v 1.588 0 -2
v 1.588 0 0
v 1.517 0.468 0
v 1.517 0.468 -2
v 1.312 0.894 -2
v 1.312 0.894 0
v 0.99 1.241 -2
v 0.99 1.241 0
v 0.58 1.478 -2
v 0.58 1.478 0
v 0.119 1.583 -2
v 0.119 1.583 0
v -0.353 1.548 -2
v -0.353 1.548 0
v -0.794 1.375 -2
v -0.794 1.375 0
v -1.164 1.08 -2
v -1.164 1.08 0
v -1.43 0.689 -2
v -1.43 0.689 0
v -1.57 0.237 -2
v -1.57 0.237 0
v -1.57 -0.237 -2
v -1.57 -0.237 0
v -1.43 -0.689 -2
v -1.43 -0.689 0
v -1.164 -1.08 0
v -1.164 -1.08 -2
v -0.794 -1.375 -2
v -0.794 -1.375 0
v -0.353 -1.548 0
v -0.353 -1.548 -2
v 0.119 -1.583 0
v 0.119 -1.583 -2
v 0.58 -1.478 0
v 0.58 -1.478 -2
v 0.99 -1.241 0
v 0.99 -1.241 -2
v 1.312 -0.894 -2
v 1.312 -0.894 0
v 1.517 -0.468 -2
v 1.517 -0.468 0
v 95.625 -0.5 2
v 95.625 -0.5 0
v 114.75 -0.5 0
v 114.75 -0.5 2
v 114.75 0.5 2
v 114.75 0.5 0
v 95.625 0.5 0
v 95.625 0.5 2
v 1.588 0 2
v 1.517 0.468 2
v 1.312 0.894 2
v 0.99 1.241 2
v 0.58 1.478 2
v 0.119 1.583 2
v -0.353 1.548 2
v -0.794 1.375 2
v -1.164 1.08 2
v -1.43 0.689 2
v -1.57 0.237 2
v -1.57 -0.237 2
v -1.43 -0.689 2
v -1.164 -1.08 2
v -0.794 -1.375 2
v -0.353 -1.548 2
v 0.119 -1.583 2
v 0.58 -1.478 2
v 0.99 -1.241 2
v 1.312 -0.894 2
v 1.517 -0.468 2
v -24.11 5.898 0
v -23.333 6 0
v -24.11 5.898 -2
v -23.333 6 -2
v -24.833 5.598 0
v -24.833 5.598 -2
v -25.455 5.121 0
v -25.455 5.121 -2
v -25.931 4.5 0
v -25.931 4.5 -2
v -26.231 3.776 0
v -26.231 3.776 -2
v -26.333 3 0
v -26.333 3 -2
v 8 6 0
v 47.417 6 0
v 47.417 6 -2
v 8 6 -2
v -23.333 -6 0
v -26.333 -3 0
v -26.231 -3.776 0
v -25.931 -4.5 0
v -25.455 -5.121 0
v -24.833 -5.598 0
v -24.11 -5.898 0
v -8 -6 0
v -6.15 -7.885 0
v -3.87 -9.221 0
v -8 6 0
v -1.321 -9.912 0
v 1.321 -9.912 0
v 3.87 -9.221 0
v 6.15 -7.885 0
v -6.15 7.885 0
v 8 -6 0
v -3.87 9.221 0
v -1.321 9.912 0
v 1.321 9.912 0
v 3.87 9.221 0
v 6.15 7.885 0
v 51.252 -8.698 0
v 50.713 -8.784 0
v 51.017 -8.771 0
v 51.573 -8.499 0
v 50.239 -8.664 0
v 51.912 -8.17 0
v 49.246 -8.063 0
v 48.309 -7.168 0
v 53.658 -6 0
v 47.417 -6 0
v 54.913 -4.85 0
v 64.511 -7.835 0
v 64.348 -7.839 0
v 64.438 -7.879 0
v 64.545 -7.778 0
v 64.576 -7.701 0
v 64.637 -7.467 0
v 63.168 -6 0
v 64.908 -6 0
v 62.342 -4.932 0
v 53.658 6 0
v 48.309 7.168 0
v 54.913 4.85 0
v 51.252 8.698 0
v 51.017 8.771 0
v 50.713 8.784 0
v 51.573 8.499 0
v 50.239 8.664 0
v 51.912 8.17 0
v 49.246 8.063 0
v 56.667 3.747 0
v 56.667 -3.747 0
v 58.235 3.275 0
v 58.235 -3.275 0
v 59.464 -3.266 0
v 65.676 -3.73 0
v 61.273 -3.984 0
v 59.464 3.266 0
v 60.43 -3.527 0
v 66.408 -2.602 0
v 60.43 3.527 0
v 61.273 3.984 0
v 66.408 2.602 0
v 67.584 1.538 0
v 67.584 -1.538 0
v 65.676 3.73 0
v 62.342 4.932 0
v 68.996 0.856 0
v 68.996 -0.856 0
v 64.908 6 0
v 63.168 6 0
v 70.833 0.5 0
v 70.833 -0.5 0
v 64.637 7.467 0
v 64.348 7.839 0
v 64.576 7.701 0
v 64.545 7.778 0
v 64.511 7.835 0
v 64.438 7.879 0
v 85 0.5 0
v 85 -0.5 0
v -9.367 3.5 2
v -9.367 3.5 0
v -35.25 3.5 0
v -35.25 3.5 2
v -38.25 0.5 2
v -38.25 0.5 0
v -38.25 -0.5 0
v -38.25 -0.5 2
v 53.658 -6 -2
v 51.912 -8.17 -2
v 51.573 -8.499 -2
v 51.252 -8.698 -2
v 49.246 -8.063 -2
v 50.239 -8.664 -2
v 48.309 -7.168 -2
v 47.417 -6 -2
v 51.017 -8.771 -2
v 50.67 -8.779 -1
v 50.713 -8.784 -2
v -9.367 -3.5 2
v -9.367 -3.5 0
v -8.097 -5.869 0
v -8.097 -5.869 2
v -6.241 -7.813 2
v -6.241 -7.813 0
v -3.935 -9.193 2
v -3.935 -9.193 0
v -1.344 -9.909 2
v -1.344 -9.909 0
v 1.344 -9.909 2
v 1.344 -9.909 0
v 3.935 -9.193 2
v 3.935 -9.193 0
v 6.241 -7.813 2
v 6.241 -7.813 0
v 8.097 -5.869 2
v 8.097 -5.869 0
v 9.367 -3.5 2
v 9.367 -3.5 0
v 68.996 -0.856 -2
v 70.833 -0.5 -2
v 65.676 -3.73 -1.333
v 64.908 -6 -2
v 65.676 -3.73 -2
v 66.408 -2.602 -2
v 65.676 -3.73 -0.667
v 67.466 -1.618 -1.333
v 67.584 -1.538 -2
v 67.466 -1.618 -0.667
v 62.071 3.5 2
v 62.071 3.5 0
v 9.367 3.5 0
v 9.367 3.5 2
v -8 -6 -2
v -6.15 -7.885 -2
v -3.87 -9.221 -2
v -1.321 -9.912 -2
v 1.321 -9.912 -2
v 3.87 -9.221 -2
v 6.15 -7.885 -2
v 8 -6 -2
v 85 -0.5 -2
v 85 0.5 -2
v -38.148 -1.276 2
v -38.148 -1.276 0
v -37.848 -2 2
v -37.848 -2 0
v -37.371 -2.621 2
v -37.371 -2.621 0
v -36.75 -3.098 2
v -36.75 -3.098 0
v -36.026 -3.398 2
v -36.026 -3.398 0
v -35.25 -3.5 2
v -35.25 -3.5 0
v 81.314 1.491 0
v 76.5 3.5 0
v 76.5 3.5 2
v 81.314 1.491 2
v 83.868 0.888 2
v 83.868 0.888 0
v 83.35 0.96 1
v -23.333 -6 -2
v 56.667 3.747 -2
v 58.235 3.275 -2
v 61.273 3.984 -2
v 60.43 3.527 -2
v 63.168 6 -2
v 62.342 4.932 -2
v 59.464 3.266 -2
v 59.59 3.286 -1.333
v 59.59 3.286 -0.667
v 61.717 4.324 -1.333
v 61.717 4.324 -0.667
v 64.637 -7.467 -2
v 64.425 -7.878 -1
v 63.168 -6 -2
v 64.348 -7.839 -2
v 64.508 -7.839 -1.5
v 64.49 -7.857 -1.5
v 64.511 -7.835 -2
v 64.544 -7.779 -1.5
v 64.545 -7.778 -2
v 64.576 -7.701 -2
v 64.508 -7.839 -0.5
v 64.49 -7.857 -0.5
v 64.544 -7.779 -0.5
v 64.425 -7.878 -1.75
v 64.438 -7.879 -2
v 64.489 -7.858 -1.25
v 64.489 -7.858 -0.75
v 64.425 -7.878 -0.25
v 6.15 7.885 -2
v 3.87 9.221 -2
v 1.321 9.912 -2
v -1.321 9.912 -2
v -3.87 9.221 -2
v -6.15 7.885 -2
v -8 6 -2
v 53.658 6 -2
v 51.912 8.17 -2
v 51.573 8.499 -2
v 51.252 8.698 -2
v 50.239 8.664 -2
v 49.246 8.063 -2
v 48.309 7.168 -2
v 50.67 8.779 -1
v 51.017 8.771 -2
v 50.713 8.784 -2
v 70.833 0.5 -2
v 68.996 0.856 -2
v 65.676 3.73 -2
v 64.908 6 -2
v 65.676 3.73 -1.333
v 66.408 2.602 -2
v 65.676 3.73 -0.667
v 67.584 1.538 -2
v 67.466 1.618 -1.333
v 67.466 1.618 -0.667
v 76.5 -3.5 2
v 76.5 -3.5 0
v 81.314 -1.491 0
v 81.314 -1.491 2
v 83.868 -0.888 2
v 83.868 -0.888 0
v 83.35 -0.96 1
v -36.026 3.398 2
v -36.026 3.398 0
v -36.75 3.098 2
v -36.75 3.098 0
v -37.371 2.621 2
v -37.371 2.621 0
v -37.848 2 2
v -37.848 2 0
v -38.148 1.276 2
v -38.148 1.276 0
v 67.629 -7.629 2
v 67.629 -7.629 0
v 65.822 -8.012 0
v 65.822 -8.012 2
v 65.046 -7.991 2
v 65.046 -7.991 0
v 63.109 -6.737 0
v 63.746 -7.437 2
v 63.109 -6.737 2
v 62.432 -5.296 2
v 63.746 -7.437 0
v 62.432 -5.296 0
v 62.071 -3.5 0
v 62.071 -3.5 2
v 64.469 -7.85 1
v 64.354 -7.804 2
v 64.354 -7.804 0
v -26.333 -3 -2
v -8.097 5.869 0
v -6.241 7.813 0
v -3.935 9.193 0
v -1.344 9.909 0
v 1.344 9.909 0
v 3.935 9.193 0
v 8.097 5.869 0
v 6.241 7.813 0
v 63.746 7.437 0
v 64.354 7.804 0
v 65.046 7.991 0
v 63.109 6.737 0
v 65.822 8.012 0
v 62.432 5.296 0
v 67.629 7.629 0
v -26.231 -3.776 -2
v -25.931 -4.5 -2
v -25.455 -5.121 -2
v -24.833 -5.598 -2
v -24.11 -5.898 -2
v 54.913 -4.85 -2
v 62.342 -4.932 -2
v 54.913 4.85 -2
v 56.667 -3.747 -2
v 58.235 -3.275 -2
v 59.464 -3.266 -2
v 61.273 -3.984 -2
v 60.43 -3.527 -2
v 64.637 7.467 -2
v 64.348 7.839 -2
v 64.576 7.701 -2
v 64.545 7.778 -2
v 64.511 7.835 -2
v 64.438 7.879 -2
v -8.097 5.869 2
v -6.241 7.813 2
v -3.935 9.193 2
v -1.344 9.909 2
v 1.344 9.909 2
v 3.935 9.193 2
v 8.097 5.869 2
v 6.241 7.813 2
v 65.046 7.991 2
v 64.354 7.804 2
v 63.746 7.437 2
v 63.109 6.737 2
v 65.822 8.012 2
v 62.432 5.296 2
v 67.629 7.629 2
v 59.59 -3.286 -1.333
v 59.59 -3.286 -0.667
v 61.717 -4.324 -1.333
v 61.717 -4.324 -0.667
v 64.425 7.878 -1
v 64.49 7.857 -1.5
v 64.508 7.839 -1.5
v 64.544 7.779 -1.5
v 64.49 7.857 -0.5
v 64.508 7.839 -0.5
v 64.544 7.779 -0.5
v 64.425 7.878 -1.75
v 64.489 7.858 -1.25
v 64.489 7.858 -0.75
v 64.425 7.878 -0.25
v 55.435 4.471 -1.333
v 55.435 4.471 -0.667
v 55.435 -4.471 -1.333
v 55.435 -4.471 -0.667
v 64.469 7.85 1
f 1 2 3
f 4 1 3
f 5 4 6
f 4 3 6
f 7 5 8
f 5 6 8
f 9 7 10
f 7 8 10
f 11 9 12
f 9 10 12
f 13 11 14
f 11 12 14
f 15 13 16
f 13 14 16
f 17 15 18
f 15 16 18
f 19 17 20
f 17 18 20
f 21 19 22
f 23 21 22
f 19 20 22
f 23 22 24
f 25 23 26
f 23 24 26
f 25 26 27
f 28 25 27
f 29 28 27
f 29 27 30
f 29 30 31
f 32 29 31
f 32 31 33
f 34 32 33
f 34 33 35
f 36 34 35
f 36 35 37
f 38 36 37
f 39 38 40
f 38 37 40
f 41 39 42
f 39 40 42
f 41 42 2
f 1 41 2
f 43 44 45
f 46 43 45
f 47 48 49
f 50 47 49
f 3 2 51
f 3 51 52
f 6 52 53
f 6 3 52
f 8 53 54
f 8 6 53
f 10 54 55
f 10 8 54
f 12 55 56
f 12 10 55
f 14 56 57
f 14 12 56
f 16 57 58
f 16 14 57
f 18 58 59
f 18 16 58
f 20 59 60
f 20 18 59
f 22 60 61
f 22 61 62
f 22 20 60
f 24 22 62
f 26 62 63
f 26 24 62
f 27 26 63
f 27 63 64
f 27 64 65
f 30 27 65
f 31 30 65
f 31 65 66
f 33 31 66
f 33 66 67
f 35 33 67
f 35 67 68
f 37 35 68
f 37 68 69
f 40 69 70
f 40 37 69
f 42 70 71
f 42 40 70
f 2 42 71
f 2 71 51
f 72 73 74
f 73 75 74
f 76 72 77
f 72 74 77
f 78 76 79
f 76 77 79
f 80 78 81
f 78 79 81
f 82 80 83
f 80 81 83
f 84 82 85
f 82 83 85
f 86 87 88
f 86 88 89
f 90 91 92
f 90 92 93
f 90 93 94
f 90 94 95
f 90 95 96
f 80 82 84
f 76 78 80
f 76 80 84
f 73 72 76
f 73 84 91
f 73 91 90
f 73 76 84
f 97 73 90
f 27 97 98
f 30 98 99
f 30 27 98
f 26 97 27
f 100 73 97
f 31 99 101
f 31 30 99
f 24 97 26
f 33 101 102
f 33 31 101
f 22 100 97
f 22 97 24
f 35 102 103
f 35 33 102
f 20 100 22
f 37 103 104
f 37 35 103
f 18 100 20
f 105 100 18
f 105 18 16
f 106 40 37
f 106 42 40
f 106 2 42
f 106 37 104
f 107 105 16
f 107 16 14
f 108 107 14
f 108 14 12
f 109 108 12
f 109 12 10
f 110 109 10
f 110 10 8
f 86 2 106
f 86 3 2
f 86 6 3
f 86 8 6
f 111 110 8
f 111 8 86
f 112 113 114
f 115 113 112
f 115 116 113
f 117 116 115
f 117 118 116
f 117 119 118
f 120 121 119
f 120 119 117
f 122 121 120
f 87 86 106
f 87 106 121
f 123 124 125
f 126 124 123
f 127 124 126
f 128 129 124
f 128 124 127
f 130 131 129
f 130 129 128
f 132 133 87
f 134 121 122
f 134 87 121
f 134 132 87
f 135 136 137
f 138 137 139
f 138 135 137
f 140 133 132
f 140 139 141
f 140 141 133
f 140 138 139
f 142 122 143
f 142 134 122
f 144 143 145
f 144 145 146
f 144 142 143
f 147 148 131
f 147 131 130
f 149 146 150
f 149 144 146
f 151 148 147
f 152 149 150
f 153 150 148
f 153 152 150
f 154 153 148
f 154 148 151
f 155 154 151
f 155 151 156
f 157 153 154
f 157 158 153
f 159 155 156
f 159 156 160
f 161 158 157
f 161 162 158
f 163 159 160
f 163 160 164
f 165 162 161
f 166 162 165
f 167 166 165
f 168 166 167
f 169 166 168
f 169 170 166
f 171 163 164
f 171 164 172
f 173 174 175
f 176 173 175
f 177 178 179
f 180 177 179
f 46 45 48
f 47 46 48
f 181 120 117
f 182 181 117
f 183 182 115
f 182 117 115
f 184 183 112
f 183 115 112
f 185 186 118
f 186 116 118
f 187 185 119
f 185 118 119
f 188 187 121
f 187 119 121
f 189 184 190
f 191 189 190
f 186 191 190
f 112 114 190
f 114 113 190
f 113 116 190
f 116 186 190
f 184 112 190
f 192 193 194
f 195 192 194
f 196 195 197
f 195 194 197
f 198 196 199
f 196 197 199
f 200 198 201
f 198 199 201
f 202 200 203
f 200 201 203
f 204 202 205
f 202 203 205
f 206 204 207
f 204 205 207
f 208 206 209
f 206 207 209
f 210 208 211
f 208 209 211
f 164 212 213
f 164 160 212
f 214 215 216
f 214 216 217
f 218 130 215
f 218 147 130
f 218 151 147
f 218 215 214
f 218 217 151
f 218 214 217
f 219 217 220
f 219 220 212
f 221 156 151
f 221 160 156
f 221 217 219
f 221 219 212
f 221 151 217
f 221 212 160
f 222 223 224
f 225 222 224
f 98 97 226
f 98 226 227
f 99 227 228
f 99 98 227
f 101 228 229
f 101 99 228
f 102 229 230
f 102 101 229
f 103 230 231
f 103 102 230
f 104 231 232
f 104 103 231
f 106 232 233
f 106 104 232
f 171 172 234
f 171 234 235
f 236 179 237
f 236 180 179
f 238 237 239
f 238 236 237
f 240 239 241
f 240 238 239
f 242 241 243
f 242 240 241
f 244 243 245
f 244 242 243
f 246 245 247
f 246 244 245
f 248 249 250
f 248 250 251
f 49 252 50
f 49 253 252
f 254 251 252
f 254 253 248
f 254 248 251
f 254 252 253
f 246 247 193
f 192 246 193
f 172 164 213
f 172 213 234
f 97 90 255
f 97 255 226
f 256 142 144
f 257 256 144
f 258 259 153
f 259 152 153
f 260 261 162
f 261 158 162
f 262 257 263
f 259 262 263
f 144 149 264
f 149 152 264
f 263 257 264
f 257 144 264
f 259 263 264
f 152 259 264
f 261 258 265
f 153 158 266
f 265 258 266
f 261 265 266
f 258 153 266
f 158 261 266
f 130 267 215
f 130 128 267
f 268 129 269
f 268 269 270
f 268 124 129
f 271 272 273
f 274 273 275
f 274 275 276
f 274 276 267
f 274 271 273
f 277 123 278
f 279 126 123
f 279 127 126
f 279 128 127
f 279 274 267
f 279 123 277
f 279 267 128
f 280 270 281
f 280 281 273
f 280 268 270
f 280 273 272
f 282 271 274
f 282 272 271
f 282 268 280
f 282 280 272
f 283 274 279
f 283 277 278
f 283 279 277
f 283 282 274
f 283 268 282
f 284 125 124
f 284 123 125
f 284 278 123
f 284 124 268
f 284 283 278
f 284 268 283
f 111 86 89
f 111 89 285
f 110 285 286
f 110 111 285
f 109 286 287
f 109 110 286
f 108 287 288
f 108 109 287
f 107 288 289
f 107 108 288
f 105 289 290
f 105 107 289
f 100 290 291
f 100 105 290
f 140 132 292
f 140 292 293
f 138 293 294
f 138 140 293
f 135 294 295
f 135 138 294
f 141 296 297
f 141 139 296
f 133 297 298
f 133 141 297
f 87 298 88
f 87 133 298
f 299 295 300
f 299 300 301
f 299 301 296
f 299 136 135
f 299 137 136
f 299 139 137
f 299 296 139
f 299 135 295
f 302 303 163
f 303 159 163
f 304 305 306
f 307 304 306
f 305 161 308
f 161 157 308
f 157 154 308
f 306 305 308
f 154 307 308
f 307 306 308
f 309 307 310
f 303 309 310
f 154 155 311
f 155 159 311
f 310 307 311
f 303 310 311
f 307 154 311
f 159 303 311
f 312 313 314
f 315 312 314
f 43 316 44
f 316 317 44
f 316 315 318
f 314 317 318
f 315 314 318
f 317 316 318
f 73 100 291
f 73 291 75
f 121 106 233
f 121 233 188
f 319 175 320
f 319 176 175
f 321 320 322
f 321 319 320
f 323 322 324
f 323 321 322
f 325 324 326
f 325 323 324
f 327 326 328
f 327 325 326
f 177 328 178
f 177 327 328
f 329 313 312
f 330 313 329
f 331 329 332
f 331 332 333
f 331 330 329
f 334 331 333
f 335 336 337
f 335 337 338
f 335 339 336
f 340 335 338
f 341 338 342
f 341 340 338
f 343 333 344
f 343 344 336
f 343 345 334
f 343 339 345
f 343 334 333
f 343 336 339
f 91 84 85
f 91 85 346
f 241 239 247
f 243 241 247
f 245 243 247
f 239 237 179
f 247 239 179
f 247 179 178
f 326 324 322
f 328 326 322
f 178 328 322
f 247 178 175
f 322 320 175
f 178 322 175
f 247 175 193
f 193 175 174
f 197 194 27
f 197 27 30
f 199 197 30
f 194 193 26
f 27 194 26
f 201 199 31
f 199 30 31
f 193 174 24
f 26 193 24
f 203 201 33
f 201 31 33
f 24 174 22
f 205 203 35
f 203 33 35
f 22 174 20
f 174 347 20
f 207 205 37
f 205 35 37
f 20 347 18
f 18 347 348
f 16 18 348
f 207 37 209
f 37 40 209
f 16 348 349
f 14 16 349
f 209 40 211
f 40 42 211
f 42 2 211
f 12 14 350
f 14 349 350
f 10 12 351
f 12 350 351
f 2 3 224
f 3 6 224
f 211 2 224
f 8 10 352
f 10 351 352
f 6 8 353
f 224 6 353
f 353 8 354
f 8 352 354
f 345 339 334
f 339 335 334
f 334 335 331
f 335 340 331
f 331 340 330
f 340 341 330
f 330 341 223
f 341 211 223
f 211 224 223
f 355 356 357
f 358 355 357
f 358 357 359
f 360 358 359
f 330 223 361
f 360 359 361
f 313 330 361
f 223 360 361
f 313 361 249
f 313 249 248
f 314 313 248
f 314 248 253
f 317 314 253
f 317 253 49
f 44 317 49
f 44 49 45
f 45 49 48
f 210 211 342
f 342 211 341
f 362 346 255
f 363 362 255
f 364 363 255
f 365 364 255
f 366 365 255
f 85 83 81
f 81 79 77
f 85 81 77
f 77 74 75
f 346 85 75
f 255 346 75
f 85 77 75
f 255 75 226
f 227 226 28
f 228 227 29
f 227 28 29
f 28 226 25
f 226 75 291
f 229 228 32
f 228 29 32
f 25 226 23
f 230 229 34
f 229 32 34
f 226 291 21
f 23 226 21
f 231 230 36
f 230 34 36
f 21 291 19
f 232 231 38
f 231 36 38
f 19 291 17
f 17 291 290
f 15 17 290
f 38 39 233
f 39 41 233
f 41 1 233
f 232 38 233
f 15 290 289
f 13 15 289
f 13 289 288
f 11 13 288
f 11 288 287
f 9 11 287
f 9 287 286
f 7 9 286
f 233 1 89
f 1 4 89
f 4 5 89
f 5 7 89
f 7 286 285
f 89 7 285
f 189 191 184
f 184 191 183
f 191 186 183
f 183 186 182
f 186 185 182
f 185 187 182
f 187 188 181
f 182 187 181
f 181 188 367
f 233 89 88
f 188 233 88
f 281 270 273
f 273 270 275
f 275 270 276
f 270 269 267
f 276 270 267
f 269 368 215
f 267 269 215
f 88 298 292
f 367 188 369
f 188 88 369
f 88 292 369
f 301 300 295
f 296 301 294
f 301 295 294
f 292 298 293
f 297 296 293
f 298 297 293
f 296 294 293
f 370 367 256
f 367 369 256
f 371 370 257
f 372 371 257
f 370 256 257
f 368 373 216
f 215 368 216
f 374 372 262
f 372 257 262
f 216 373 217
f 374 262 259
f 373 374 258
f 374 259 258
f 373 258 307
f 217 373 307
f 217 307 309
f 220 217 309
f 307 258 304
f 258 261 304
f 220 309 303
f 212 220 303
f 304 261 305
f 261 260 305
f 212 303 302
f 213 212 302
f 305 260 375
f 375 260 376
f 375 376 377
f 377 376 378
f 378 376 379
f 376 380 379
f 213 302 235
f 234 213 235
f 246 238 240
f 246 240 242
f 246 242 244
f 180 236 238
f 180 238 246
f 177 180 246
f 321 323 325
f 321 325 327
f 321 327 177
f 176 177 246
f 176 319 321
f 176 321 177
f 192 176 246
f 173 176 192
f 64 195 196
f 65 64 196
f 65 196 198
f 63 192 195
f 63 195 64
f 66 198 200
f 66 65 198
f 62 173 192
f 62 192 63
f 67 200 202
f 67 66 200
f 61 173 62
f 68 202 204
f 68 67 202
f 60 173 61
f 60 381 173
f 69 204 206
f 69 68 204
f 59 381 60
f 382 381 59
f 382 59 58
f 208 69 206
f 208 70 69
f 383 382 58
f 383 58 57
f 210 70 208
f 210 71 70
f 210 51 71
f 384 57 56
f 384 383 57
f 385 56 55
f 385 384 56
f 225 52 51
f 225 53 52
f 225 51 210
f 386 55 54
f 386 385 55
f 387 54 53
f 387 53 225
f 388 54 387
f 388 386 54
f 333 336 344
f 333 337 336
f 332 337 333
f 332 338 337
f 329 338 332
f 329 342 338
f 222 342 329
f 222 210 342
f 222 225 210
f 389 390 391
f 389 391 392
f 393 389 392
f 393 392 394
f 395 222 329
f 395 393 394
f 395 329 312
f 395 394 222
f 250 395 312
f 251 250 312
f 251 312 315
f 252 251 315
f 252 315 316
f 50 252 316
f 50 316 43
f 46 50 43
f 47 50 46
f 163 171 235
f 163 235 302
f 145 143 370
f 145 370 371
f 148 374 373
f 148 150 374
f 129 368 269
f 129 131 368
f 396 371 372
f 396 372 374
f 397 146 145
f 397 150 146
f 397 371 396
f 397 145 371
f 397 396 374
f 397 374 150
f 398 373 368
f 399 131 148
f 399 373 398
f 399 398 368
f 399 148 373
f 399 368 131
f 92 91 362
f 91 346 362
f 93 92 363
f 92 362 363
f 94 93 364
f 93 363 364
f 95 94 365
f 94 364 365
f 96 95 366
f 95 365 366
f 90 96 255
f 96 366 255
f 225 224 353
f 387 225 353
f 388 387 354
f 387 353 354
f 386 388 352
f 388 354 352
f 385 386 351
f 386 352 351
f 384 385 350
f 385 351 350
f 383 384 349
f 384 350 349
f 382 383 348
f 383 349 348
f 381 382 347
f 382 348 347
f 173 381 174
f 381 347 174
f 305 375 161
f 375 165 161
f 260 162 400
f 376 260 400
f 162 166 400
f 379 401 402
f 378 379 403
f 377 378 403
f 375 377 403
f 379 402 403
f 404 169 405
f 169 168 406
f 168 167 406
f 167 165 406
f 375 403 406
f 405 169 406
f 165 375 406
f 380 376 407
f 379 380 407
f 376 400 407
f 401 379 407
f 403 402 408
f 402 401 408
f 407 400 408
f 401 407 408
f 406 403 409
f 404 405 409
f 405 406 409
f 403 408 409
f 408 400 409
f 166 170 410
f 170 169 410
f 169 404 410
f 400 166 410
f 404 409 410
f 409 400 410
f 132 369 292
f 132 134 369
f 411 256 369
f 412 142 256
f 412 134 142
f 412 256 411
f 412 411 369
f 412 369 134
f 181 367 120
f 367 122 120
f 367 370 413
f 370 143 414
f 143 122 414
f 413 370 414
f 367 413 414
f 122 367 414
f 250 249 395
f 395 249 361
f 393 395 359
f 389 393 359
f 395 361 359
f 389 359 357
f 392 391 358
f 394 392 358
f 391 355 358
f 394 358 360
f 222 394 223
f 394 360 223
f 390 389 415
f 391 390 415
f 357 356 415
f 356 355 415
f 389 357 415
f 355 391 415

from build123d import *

# Parameters (mm, degrees)
F0_R     = 1.5875
F1_DEPTH = 2
F2_R     = 1.5875
F3_DEPTH = 2
F4_R     = 3
F4_2_R   = 3


with BuildPart() as f1:
    # F0 (on Top) → F1 (new body)
    with BuildSketch(Plane.XY):
        with BuildLine():
            ThreePointArc((-9.3674969976, -3.5), (-10, 0), (-9.3674969976, 3.5))
            Line((-9.3674969976, 3.5), (-38.25, 3.5))
            Line((-38.25, 3.5), (-38.25, -3.5))
            Line((-38.25, -3.5), (-9.3674969976, -3.5))
        make_face()
        with BuildLine():
            Line((-9.3674969976, 3.5), (9.3674969976, 3.5))
            ThreePointArc((9.3674969976, 3.5), (0, 10), (-9.3674969976, 3.5))
        make_face()
        with BuildLine():
            Line((62.0709539045, 3.5), (76.5, 3.5))
            add(Edge.make_bspline(
                [(76.5, 3.5), (71.9907153616, 5.4354000871), (64.55282786, 10.6078306891), (62.2970592122, 5.6150011273), (62.0709539045, 3.5)],
                knots=[0, 0, 0, 0, 0.5556190741, 0.8480780717, 0.8480780717, 0.8480780717, 0.8480780717], degree=3))
        make_face()
        with BuildLine():
            Line((9.3674969976, -3.5), (-9.3674969976, -3.5))
            ThreePointArc((-9.3674969976, -3.5), (0, -10), (9.3674969976, -3.5))
        make_face()
        with BuildLine():
            Line((76.5, -3.5), (62.0709539045, -3.5))
            add(Edge.make_bspline(
                [(76.5, -3.5), (71.9907153616, -5.4354000871), (64.55282786, -10.6078306891), (62.2970592122, -5.6150011273), (62.0709539045, -3.5)],
                knots=[0, 0, 0, 0, 0.5556190741, 0.8480780717, 0.8480780717, 0.8480780717, 0.8480780717], degree=3))
        make_face()
        with BuildLine():
            add(Edge.make_bspline(
                [(62.0709539045, 3.5), (61.9535003312, 2.401333), (61.9849445935, 1.196556193), (62.15625, 0)],
                knots=[0.8480780717, 0.8480780717, 0.8480780717, 0.8480780717, 1, 1, 1, 1], degree=3))
            Line((62.0709539045, 3.5), (9.3674969976, 3.5))
            ThreePointArc((9.3674969976, 3.5), (9.8406038935, 1.7783461452), (10, 0))
            ThreePointArc((10, 0), (9.8406038935, -1.7783461452), (9.3674969976, -3.5))
            Line((9.3674969976, -3.5), (62.0709539045, -3.5))
            add(Edge.make_bspline(
                [(62.0709539045, -3.5), (61.9535003312, -2.401333), (61.9849445935, -1.196556193), (62.15625, 0)],
                knots=[0.8480780717, 0.8480780717, 0.8480780717, 0.8480780717, 1, 1, 1, 1], degree=3))
        make_face()
        with BuildLine():
            ThreePointArc((10, 0), (9.8406038935, 1.7783461452), (9.3674969976, 3.5))
            Line((9.3674969976, 3.5), (-9.3674969976, 3.5))
            ThreePointArc((-9.3674969976, 3.5), (-10, 0), (-9.3674969976, -3.5))
            Line((-9.3674969976, -3.5), (9.3674969976, -3.5))
            ThreePointArc((9.3674969976, -3.5), (9.8406038935, -1.7783461452), (10, 0))
        make_face()
        Circle(F0_R, mode=Mode.SUBTRACT)
        with BuildLine():
            add(Edge.make_bspline(
                [(76.5, 3.5), (81.2292632272, 1.3920385639), (83.5245438479, 0.7969108606), (86.4633302777, 0.6546642008), (95.625, 0.5)],
                knots=[0, 0, 0, 0, 0.4354164629, 1, 1, 1, 1], degree=3))
            Line((76.5, 3.5), (62.0709539045, 3.5))
            add(Edge.make_bspline(
                [(62.0709539045, 3.5), (61.9535003312, 2.401333), (61.9849445935, 1.196556193), (62.15625, 0)],
                knots=[0.8480780717, 0.8480780717, 0.8480780717, 0.8480780717, 1, 1, 1, 1], degree=3))
            add(Edge.make_bspline(
                [(62.0709539045, -3.5), (61.9535003312, -2.401333), (61.9849445935, -1.196556193), (62.15625, 0)],
                knots=[0.8480780717, 0.8480780717, 0.8480780717, 0.8480780717, 1, 1, 1, 1], degree=3))
            Line((62.0709539045, -3.5), (76.5, -3.5))
            add(Edge.make_bspline(
                [(76.5, -3.5), (81.2292632272, -1.3920385639), (83.5245438479, -0.7969108606), (86.4633302777, -0.6546642008), (95.625, -0.5)],
                knots=[0, 0, 0, 0, 0.4354164629, 1, 1, 1, 1], degree=3))
            Line((95.625, -0.5), (114.75, -0.5))
            Line((114.75, -0.5), (114.75, 0.5))
            Line((114.75, 0.5), (95.625, 0.5))
        make_face()
    extrude(amount=F1_DEPTH)

    # F4#2
    f4_2_edges = [f1.edges().sort_by_distance(p)[0] for p in [
        (-38.25, 3.5, 1),
        (-38.25, -3.5, 1),
    ]]
    fillet(f4_2_edges, radius=F4_2_R)


with BuildPart() as f3:
    # F2 (on Top) → F3 (new body)
    with BuildSketch(Plane.XY):
        with BuildLine():
            Line((-8, 6), (-26.33333333, 6))
            Line((-26.33333333, 6), (-26.33333333, -6))
            Line((-26.33333333, -6), (-8, -6))
            ThreePointArc((-8, -6), (-10, 0), (-8, 6))
        make_face()
        with BuildLine():
            ThreePointArc((8, 6), (0, 10), (-8, 6))
            Line((-8, 6), (8, 6))
        make_face()
        with BuildLine():
            Line((8, -6), (-8, -6))
            ThreePointArc((-8, -6), (0, -10), (8, -6))
        make_face()
        with BuildLine():
            Line((53.6581738244, 6), (47.4167542526, 6))
            add(Edge.make_bspline(
                [(47.4167542526, 6), (46.3220957553, 4.3280086445), (45.5684344657, 2.1206918096), (46.0416666667, 0)],
                knots=[0.726906329, 0.726906329, 0.726906329, 0.726906329, 1, 1, 1, 1], degree=3))
            add(Edge.make_bspline(
                [(47.4167542526, -6), (46.3220957553, -4.3280086445), (45.5684344657, -2.1206918096), (46.0416666667, 0)],
                knots=[0.726906329, 0.726906329, 0.726906329, 0.726906329, 1, 1, 1, 1], degree=3))
            Line((47.4167542526, -6), (53.6581738244, -6))
            add(Edge.make_bspline(
                [(56.6666666667, -3.747044364), (55.2992674084, -4.4409490289), (54.3604326541, -5.2428049781), (53.6581738244, -6)],
                knots=[0, 0, 0, 0, 0.1542850544, 0.1542850544, 0.1542850544, 0.1542850544], degree=3))
            add(Edge.make_bspline(
                [(56.6666666667, -3.747044364), (60.0277227864, -2.2489301029), (62.0161168237, -4.2916810168), (63.1679295713, -6)],
                knots=[0, 0, 0, 0, 0.3094476025, 0.3094476025, 0.3094476025, 0.3094476025], degree=3))
            Line((63.1679295713, -6), (64.907909688, -6))
            add(Edge.make_bspline(
                [(64.907909688, -6), (65.3495372223, -3.9292189456), (66.4917594583, -0.8436001546), (70.8333333333, -0.5)],
                knots=[0.6644360976, 0.6644360976, 0.6644360976, 0.6644360976, 1, 1, 1, 1], degree=3))
            Line((70.8333333333, -0.5), (85, -0.5))
            Line((85, -0.5), (85, 0.5))
            Line((85, 0.5), (70.8333333333, 0.5))
            add(Edge.make_bspline(
                [(64.907909688, 6), (65.3495372223, 3.9292189456), (66.4917594583, 0.8436001546), (70.8333333333, 0.5)],
                knots=[0.6644360976, 0.6644360976, 0.6644360976, 0.6644360976, 1, 1, 1, 1], degree=3))
            Line((64.907909688, 6), (63.1679295713, 6))
            add(Edge.make_bspline(
                [(56.6666666667, 3.747044364), (60.0277227864, 2.2489301029), (62.0161168237, 4.2916810168), (63.1679295713, 6)],
                knots=[0, 0, 0, 0, 0.3094476025, 0.3094476025, 0.3094476025, 0.3094476025], degree=3))
            add(Edge.make_bspline(
                [(56.6666666667, 3.747044364), (55.2992674084, 4.4409490289), (54.3604326541, 5.2428049781), (53.6581738244, 6)],
                knots=[0, 0, 0, 0, 0.1542850544, 0.1542850544, 0.1542850544, 0.1542850544], degree=3))
        make_face()
        with BuildLine():
            Line((47.4167542526, 6), (8, 6))
            ThreePointArc((8, 6), (9.4868329805, 3.1622776602), (10, 0))
            ThreePointArc((10, 0), (9.4868329805, -3.1622776602), (8, -6))
            Line((8, -6), (47.4167542526, -6))
            add(Edge.make_bspline(
                [(47.4167542526, -6), (46.3220957553, -4.3280086445), (45.5684344657, -2.1206918096), (46.0416666667, 0)],
                knots=[0.726906329, 0.726906329, 0.726906329, 0.726906329, 1, 1, 1, 1], degree=3))
            add(Edge.make_bspline(
                [(47.4167542526, 6), (46.3220957553, 4.3280086445), (45.5684344657, 2.1206918096), (46.0416666667, 0)],
                knots=[0.726906329, 0.726906329, 0.726906329, 0.726906329, 1, 1, 1, 1], degree=3))
        make_face()
        with BuildLine():
            Line((8, 6), (-8, 6))
            ThreePointArc((-8, 6), (-10, 0), (-8, -6))
            Line((-8, -6), (8, -6))
            ThreePointArc((8, -6), (9.4868329805, -3.1622776602), (10, 0))
            ThreePointArc((10, 0), (9.4868329805, 3.1622776602), (8, 6))
        make_face()
        Circle(F2_R, mode=Mode.SUBTRACT)
        with BuildLine():
            Line((64.907909688, -6), (63.1679295713, -6))
            add(Edge.make_bspline(
                [(63.1679295713, -6), (63.8278590037, -6.9787788677), (64.5993236597, -8.718696784), (64.6740549365, -7.0965393941), (64.907909688, -6)],
                knots=[0.3094476025, 0.3094476025, 0.3094476025, 0.3094476025, 0.4867451547, 0.6644360976, 0.6644360976, 0.6644360976, 0.6644360976], degree=3))
        make_face()
        with BuildLine():
            add(Edge.make_bspline(
                [(63.1679295713, 6), (63.8278590037, 6.9787788677), (64.5993236597, 8.718696784), (64.6740549365, 7.0965393941), (64.907909688, 6)],
                knots=[0.3094476025, 0.3094476025, 0.3094476025, 0.3094476025, 0.4867451547, 0.6644360976, 0.6644360976, 0.6644360976, 0.6644360976], degree=3))
            Line((63.1679295713, 6), (64.907909688, 6))
        make_face()
        with BuildLine():
            add(Edge.make_bspline(
                [(53.6581738244, 6), (52.2194091826, 7.5513160935), (51.4119093355, 10.0220105563), (48.4450081755, 7.5705644038), (47.4167542526, 6)],
                knots=[0.1542850544, 0.1542850544, 0.1542850544, 0.1542850544, 0.4703791662, 0.726906329, 0.726906329, 0.726906329, 0.726906329], degree=3))
            Line((47.4167542526, 6), (53.6581738244, 6))
        make_face()
        with BuildLine():
            Line((53.6581738244, -6), (47.4167542526, -6))
            add(Edge.make_bspline(
                [(53.6581738244, -6), (52.2194091826, -7.5513160935), (51.4119093355, -10.0220105563), (48.4450081755, -7.5705644038), (47.4167542526, -6)],
                knots=[0.1542850544, 0.1542850544, 0.1542850544, 0.1542850544, 0.4703791662, 0.726906329, 0.726906329, 0.726906329, 0.726906329], degree=3))
        make_face()
    extrude(amount=-F3_DEPTH)

    # F4
    f4_edges = [f3.edges().sort_by_distance(p)[0] for p in [
        (-26.333333, 6, -1),
        (-26.333333, -6, -1),
    ]]
    fillet(f4_edges, radius=F4_R)


solid = Compound([f1.part, f3.part])
